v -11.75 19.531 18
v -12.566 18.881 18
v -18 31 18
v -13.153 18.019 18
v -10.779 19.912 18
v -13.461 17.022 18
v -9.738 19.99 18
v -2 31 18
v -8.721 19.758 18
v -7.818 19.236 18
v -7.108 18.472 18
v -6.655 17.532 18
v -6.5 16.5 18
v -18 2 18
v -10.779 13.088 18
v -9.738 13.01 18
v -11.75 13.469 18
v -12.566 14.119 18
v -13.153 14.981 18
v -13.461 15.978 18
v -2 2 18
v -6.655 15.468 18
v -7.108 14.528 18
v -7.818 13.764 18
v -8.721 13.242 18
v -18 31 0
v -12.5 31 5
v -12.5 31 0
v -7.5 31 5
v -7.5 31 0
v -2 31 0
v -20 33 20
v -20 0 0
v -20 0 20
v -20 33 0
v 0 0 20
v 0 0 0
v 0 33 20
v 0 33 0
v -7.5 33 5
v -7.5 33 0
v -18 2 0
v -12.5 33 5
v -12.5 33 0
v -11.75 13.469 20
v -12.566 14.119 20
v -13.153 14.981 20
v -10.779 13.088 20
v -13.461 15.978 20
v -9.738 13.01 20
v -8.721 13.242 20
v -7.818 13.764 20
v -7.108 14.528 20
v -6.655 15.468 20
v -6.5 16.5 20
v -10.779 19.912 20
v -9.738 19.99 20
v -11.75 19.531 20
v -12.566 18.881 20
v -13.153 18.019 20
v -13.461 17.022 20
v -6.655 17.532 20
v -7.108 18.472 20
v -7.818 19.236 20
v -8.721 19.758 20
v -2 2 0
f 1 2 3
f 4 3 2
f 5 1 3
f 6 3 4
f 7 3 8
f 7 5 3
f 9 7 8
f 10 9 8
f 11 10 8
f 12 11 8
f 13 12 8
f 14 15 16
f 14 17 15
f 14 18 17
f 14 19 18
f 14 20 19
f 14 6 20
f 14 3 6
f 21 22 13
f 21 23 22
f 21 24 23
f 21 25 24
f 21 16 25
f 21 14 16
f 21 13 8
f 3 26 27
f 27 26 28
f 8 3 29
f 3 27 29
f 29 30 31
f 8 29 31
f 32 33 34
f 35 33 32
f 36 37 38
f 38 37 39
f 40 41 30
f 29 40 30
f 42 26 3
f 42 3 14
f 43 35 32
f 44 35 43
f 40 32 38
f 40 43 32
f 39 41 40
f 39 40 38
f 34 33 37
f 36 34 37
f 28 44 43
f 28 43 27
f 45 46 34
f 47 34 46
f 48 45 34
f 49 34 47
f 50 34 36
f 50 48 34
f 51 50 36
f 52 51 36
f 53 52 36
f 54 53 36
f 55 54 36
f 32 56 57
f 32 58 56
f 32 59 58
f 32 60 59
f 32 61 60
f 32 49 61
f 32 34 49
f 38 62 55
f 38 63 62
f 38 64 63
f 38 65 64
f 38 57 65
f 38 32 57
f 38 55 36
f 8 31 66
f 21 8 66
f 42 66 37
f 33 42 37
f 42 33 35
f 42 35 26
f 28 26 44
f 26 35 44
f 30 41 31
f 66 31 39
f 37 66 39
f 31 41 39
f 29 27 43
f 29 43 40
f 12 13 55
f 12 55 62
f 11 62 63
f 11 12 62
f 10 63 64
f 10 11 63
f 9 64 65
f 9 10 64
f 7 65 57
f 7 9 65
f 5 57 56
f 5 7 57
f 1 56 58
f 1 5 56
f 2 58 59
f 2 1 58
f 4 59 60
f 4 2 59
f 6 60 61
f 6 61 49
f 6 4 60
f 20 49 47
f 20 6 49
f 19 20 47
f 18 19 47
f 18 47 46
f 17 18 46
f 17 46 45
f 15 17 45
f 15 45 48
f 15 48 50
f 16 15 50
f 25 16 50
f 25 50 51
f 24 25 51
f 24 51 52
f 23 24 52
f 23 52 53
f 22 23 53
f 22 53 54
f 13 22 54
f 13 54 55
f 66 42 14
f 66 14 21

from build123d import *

# Parameters (mm, degrees)
F0_W     = 20
F0_H     = 33
F0_R     = 3.5
F1_DEPTH = 20
F2_W     = 16
F2_H     = 29
F2_R     = 3.5
F3_DEPTH = 18
F4_W     = 5
F4_H     = 2
F5_DEPTH = 5


with BuildPart() as f1:
    # F0 (on Top) → F1 (new body)
    with BuildSketch(Plane.XY):
        with Locations((-10, 16.5)):
            Rectangle(F0_W, F0_H)
        with Locations((-10, 16.5)):
            Circle(F0_R, mode=Mode.SUBTRACT)
    extrude(amount=F1_DEPTH)

    # F2 (on face) → F3 (cut)
    with BuildSketch(Plane(origin=(0, 0, 0), x_dir=(1, 0, 0), z_dir=(0, 0, -1))):
        with Locations((-10, -16.5)):
            Rectangle(F2_W, F2_H)
        with Locations((-10, -16.5)):
            Circle(F2_R, mode=Mode.SUBTRACT)
    extrude(amount=-F3_DEPTH, mode=Mode.SUBTRACT)

    # F4 (on face) → F5 (cut)
    with BuildSketch(Plane(origin=(0, 0, 0), x_dir=(1, 0, 0), z_dir=(0, 0, -1))):
        with Locations((-10, -32)):
            Rectangle(F4_W, F4_H)
    extrude(amount=-F5_DEPTH, mode=Mode.SUBTRACT)


solid = f1.part
